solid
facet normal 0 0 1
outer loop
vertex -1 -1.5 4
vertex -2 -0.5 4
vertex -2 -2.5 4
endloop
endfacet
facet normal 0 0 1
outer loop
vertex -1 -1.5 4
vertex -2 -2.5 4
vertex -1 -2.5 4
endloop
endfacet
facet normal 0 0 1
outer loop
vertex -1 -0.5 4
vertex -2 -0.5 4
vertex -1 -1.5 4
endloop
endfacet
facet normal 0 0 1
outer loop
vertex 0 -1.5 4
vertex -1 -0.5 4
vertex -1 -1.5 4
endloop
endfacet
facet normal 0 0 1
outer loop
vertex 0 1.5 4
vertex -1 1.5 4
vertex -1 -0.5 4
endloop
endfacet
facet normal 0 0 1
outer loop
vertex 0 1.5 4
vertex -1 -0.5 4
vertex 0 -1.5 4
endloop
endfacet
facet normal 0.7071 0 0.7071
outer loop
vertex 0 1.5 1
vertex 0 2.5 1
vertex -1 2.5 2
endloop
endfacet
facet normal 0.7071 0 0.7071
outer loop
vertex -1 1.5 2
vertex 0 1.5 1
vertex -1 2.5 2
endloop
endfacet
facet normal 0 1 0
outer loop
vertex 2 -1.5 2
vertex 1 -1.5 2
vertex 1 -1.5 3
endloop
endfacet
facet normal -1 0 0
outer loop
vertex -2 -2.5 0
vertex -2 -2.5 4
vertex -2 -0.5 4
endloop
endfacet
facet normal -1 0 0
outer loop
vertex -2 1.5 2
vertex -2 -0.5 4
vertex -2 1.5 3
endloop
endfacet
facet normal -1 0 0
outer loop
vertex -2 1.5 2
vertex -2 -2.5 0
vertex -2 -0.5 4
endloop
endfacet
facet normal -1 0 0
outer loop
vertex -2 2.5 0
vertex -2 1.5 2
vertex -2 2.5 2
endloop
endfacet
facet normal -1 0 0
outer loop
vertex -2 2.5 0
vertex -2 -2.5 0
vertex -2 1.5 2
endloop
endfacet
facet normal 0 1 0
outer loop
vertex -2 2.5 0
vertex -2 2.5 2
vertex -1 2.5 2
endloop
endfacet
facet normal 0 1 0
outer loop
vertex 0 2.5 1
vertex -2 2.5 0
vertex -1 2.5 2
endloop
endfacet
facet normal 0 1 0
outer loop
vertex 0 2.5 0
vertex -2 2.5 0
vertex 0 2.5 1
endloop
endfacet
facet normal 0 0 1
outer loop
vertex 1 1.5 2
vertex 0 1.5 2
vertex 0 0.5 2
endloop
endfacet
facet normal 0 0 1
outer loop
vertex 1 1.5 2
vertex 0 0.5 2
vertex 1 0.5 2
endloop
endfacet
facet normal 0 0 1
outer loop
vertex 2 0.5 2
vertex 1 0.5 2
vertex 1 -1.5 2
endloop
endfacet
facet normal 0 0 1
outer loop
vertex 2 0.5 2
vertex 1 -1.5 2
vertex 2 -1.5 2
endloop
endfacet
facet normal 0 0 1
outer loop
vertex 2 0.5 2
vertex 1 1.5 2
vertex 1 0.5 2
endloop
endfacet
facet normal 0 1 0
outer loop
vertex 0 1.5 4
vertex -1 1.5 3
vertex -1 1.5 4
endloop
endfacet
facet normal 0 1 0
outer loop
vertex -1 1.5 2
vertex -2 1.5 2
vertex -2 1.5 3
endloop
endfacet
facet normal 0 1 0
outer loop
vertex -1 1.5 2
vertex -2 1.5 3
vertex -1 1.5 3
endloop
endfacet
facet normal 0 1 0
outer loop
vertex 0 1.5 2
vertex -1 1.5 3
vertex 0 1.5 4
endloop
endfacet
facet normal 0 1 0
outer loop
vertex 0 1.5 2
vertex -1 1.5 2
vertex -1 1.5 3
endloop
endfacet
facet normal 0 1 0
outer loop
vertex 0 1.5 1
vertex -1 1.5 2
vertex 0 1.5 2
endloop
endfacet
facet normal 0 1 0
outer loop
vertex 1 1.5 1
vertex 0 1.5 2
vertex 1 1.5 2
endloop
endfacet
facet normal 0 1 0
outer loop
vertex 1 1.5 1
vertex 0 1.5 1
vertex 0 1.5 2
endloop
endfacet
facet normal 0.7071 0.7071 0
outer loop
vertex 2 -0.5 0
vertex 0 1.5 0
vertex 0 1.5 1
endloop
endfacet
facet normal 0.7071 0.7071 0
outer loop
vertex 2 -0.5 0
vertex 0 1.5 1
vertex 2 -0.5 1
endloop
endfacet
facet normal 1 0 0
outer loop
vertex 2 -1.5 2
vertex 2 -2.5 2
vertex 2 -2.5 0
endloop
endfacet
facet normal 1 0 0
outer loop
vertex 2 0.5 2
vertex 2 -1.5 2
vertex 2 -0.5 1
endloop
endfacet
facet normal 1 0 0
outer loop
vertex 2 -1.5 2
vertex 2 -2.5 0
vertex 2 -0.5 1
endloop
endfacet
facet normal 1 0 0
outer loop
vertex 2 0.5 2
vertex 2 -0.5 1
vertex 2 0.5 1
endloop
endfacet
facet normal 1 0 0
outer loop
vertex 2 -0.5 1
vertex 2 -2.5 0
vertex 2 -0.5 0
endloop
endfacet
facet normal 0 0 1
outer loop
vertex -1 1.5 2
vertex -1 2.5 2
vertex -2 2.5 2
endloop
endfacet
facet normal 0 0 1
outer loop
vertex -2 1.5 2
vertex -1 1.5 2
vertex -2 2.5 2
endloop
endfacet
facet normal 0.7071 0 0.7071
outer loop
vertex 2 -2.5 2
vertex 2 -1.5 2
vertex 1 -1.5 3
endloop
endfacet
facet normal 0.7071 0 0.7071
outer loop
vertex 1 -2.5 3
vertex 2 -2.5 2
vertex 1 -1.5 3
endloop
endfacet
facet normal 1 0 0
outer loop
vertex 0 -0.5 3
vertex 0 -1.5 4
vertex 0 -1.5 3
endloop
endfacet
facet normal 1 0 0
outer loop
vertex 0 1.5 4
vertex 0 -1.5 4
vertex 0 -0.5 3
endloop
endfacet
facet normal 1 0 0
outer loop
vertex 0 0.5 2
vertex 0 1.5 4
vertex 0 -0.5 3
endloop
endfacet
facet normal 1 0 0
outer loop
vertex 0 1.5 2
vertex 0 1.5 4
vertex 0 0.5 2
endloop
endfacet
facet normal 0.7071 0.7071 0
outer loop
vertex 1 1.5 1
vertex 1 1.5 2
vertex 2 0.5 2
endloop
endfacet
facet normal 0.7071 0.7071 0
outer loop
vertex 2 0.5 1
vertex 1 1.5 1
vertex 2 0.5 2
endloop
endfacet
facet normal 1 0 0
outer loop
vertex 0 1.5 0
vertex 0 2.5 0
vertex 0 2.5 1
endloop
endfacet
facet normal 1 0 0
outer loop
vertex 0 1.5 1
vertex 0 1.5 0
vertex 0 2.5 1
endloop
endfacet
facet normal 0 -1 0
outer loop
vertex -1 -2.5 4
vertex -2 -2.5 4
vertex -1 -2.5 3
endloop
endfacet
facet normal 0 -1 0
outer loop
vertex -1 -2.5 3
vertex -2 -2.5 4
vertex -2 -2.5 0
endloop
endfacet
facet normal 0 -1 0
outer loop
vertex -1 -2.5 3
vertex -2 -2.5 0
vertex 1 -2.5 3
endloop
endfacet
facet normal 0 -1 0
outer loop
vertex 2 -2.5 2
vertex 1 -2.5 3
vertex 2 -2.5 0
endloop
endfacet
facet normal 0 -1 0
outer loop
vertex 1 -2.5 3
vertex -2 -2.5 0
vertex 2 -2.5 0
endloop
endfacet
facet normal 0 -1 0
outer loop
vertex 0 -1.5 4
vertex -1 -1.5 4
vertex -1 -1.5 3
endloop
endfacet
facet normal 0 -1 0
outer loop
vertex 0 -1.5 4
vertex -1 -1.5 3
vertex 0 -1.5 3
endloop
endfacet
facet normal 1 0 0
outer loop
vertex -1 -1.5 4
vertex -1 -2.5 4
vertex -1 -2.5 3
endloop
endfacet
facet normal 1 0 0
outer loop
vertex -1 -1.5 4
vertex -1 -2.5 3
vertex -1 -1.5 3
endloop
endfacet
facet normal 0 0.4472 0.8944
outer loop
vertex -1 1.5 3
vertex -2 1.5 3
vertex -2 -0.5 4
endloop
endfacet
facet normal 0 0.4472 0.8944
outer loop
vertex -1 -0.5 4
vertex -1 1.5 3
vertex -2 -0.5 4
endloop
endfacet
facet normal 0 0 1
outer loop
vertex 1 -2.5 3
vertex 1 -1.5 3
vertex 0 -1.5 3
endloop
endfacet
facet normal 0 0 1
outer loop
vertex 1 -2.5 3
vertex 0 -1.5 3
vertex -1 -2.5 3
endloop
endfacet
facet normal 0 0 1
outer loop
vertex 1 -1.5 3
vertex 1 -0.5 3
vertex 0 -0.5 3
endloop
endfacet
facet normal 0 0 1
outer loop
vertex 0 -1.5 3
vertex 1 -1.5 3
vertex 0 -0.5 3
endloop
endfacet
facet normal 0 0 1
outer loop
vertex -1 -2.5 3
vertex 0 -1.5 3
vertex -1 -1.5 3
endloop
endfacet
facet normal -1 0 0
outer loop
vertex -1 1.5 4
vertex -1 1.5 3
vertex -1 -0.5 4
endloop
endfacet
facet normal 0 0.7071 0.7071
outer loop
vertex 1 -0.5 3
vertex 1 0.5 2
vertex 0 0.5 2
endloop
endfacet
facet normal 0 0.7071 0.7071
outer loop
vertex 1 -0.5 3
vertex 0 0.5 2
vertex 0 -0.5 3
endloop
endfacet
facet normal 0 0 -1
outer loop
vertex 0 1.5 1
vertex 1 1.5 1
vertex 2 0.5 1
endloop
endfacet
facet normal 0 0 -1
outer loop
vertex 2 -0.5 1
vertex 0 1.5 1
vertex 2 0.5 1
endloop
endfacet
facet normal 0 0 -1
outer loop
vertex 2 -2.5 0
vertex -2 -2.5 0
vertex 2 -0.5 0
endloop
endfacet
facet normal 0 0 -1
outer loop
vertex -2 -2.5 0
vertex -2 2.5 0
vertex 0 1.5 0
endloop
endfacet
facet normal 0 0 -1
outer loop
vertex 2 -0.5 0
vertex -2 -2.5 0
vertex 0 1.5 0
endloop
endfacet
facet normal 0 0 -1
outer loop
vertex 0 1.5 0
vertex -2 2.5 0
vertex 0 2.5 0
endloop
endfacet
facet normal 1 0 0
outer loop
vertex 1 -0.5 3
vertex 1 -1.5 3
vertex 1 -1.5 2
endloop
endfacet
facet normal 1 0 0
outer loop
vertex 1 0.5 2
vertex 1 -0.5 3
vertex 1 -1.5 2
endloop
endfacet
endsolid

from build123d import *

# Parameters (mm, degrees)
SKETCH1_W           = 4
SKETCH1_H           = 5
BOSS_EXTRUDE1_DEPTH = 4
SKETCH2_OUTSIDE_W   = 7.51
SKETCH2_OUTSIDE_H   = 7.51
CUT_EXTRUDE1_DEPTH  = 1
CUT_EXTRUDE2_DEPTH  = 1
CUT_EXTRUDE3_DEPTH  = 1
CUT_EXTRUDE4_DEPTH  = 5
CUT_EXTRUDE5_DEPTH  = 1
SKETCH7_W           = 2
SKETCH7_H           = 1
CUT_EXTRUDE6_DEPTH  = 1
CUT_EXTRUDE7_DEPTH  = 2
SKETCH9_W           = 1
SKETCH9_H           = 1
CUT_EXTRUDE9_DEPTH  = 3
CUT_EXTRUDE10_DEPTH = 3


with BuildPart() as part:
    # Sketch1 → Boss-Extrude1 (new body)
    with BuildSketch(Plane.XY):
        Rectangle(SKETCH1_W, SKETCH1_H)
    extrude(amount=BOSS_EXTRUDE1_DEPTH)

    # Sketch2 outside → Cut-Extrude1 (cut)
    with BuildSketch(Plane(origin=(0, 2.5, 0), x_dir=(1, 0, 0), z_dir=(0, 1, 0))):
        with Locations((0, -2)):
            Rectangle(SKETCH2_OUTSIDE_W, SKETCH2_OUTSIDE_H)
        Polygon((0, 0), (0, -1), (-1, -2), (-2, -2), (-2, 0), align=None, mode=Mode.SUBTRACT)
    extrude(amount=-CUT_EXTRUDE1_DEPTH, mode=Mode.SUBTRACT)

    # Sketch3 → Cut-Extrude2 (cut)
    with BuildSketch(Plane(origin=(0, 0, 0), x_dir=(-1, 0, 0), z_dir=(0, 0, -1))):
        Polygon((0, 1.5), (-2, -0.5), (-2, 1.5), align=None)
    extrude(amount=-CUT_EXTRUDE2_DEPTH, mode=Mode.SUBTRACT)

    # Sketch4 → Cut-Extrude3 (cut)
    with BuildSketch(Plane.ZY.offset(2)):
        Polygon((3, 1.5), (4, -0.5), (4, 1.5), align=None)
    extrude(amount=-CUT_EXTRUDE3_DEPTH, mode=Mode.SUBTRACT)

    # Sketch5 → Cut-Extrude4 (cut, through all)
    with BuildSketch(Plane.XY.offset(4)):
        Polygon((2, 1.5), (1, 1.5), (2, 0.5), align=None)
    extrude(amount=-CUT_EXTRUDE4_DEPTH, mode=Mode.SUBTRACT)

    # Sketch6 → Cut-Extrude5 (cut)
    with BuildSketch(Plane.XY.offset(4)):
        Polygon((-1, -2.5), (-1, -1.5), (0, -1.5), (0, 1.5), (1, 1.5), (2, 0.5), (2, -2.5), align=None)
    extrude(amount=-CUT_EXTRUDE5_DEPTH, mode=Mode.SUBTRACT)

    # Sketch7 → Cut-Extrude6 (cut)
    with BuildSketch(Plane(origin=(0, 1.5, 0), x_dir=(1, 0, 0), z_dir=(0, 1, 0))):
        with Locations((1, -2.5)):
            Rectangle(SKETCH7_W, SKETCH7_H)
    extrude(amount=-CUT_EXTRUDE6_DEPTH, mode=Mode.SUBTRACT)

    # Sketch8 → Cut-Extrude7 (cut)
    with BuildSketch(Plane(origin=(2, 0, 0), x_dir=(0, 0, -1), z_dir=(1, 0, 0))):
        Polygon((-2, 0.5), (-3, -0.5), (-3, 0.5), align=None)
    extrude(amount=-CUT_EXTRUDE7_DEPTH, mode=Mode.SUBTRACT)

    # Sketch9 → Cut-Extrude9 (cut)
    with BuildSketch(Plane(origin=(0, 1.5, 0), x_dir=(1, 0, 0), z_dir=(0, 1, 0))):
        with Locations((1.5, -2.5)):
            Rectangle(SKETCH9_W, SKETCH9_H)
    extrude(amount=-CUT_EXTRUDE9_DEPTH, mode=Mode.SUBTRACT)

    # Sketch10 → Cut-Extrude10 (cut)
    with BuildSketch(Plane(origin=(0, -1.5, 0), x_dir=(1, 0, 0), z_dir=(0, 1, 0))):
        Polygon((2, -2), (1, -3), (2, -3), align=None)
    extrude(amount=-CUT_EXTRUDE10_DEPTH, mode=Mode.SUBTRACT)


solid = part.part
